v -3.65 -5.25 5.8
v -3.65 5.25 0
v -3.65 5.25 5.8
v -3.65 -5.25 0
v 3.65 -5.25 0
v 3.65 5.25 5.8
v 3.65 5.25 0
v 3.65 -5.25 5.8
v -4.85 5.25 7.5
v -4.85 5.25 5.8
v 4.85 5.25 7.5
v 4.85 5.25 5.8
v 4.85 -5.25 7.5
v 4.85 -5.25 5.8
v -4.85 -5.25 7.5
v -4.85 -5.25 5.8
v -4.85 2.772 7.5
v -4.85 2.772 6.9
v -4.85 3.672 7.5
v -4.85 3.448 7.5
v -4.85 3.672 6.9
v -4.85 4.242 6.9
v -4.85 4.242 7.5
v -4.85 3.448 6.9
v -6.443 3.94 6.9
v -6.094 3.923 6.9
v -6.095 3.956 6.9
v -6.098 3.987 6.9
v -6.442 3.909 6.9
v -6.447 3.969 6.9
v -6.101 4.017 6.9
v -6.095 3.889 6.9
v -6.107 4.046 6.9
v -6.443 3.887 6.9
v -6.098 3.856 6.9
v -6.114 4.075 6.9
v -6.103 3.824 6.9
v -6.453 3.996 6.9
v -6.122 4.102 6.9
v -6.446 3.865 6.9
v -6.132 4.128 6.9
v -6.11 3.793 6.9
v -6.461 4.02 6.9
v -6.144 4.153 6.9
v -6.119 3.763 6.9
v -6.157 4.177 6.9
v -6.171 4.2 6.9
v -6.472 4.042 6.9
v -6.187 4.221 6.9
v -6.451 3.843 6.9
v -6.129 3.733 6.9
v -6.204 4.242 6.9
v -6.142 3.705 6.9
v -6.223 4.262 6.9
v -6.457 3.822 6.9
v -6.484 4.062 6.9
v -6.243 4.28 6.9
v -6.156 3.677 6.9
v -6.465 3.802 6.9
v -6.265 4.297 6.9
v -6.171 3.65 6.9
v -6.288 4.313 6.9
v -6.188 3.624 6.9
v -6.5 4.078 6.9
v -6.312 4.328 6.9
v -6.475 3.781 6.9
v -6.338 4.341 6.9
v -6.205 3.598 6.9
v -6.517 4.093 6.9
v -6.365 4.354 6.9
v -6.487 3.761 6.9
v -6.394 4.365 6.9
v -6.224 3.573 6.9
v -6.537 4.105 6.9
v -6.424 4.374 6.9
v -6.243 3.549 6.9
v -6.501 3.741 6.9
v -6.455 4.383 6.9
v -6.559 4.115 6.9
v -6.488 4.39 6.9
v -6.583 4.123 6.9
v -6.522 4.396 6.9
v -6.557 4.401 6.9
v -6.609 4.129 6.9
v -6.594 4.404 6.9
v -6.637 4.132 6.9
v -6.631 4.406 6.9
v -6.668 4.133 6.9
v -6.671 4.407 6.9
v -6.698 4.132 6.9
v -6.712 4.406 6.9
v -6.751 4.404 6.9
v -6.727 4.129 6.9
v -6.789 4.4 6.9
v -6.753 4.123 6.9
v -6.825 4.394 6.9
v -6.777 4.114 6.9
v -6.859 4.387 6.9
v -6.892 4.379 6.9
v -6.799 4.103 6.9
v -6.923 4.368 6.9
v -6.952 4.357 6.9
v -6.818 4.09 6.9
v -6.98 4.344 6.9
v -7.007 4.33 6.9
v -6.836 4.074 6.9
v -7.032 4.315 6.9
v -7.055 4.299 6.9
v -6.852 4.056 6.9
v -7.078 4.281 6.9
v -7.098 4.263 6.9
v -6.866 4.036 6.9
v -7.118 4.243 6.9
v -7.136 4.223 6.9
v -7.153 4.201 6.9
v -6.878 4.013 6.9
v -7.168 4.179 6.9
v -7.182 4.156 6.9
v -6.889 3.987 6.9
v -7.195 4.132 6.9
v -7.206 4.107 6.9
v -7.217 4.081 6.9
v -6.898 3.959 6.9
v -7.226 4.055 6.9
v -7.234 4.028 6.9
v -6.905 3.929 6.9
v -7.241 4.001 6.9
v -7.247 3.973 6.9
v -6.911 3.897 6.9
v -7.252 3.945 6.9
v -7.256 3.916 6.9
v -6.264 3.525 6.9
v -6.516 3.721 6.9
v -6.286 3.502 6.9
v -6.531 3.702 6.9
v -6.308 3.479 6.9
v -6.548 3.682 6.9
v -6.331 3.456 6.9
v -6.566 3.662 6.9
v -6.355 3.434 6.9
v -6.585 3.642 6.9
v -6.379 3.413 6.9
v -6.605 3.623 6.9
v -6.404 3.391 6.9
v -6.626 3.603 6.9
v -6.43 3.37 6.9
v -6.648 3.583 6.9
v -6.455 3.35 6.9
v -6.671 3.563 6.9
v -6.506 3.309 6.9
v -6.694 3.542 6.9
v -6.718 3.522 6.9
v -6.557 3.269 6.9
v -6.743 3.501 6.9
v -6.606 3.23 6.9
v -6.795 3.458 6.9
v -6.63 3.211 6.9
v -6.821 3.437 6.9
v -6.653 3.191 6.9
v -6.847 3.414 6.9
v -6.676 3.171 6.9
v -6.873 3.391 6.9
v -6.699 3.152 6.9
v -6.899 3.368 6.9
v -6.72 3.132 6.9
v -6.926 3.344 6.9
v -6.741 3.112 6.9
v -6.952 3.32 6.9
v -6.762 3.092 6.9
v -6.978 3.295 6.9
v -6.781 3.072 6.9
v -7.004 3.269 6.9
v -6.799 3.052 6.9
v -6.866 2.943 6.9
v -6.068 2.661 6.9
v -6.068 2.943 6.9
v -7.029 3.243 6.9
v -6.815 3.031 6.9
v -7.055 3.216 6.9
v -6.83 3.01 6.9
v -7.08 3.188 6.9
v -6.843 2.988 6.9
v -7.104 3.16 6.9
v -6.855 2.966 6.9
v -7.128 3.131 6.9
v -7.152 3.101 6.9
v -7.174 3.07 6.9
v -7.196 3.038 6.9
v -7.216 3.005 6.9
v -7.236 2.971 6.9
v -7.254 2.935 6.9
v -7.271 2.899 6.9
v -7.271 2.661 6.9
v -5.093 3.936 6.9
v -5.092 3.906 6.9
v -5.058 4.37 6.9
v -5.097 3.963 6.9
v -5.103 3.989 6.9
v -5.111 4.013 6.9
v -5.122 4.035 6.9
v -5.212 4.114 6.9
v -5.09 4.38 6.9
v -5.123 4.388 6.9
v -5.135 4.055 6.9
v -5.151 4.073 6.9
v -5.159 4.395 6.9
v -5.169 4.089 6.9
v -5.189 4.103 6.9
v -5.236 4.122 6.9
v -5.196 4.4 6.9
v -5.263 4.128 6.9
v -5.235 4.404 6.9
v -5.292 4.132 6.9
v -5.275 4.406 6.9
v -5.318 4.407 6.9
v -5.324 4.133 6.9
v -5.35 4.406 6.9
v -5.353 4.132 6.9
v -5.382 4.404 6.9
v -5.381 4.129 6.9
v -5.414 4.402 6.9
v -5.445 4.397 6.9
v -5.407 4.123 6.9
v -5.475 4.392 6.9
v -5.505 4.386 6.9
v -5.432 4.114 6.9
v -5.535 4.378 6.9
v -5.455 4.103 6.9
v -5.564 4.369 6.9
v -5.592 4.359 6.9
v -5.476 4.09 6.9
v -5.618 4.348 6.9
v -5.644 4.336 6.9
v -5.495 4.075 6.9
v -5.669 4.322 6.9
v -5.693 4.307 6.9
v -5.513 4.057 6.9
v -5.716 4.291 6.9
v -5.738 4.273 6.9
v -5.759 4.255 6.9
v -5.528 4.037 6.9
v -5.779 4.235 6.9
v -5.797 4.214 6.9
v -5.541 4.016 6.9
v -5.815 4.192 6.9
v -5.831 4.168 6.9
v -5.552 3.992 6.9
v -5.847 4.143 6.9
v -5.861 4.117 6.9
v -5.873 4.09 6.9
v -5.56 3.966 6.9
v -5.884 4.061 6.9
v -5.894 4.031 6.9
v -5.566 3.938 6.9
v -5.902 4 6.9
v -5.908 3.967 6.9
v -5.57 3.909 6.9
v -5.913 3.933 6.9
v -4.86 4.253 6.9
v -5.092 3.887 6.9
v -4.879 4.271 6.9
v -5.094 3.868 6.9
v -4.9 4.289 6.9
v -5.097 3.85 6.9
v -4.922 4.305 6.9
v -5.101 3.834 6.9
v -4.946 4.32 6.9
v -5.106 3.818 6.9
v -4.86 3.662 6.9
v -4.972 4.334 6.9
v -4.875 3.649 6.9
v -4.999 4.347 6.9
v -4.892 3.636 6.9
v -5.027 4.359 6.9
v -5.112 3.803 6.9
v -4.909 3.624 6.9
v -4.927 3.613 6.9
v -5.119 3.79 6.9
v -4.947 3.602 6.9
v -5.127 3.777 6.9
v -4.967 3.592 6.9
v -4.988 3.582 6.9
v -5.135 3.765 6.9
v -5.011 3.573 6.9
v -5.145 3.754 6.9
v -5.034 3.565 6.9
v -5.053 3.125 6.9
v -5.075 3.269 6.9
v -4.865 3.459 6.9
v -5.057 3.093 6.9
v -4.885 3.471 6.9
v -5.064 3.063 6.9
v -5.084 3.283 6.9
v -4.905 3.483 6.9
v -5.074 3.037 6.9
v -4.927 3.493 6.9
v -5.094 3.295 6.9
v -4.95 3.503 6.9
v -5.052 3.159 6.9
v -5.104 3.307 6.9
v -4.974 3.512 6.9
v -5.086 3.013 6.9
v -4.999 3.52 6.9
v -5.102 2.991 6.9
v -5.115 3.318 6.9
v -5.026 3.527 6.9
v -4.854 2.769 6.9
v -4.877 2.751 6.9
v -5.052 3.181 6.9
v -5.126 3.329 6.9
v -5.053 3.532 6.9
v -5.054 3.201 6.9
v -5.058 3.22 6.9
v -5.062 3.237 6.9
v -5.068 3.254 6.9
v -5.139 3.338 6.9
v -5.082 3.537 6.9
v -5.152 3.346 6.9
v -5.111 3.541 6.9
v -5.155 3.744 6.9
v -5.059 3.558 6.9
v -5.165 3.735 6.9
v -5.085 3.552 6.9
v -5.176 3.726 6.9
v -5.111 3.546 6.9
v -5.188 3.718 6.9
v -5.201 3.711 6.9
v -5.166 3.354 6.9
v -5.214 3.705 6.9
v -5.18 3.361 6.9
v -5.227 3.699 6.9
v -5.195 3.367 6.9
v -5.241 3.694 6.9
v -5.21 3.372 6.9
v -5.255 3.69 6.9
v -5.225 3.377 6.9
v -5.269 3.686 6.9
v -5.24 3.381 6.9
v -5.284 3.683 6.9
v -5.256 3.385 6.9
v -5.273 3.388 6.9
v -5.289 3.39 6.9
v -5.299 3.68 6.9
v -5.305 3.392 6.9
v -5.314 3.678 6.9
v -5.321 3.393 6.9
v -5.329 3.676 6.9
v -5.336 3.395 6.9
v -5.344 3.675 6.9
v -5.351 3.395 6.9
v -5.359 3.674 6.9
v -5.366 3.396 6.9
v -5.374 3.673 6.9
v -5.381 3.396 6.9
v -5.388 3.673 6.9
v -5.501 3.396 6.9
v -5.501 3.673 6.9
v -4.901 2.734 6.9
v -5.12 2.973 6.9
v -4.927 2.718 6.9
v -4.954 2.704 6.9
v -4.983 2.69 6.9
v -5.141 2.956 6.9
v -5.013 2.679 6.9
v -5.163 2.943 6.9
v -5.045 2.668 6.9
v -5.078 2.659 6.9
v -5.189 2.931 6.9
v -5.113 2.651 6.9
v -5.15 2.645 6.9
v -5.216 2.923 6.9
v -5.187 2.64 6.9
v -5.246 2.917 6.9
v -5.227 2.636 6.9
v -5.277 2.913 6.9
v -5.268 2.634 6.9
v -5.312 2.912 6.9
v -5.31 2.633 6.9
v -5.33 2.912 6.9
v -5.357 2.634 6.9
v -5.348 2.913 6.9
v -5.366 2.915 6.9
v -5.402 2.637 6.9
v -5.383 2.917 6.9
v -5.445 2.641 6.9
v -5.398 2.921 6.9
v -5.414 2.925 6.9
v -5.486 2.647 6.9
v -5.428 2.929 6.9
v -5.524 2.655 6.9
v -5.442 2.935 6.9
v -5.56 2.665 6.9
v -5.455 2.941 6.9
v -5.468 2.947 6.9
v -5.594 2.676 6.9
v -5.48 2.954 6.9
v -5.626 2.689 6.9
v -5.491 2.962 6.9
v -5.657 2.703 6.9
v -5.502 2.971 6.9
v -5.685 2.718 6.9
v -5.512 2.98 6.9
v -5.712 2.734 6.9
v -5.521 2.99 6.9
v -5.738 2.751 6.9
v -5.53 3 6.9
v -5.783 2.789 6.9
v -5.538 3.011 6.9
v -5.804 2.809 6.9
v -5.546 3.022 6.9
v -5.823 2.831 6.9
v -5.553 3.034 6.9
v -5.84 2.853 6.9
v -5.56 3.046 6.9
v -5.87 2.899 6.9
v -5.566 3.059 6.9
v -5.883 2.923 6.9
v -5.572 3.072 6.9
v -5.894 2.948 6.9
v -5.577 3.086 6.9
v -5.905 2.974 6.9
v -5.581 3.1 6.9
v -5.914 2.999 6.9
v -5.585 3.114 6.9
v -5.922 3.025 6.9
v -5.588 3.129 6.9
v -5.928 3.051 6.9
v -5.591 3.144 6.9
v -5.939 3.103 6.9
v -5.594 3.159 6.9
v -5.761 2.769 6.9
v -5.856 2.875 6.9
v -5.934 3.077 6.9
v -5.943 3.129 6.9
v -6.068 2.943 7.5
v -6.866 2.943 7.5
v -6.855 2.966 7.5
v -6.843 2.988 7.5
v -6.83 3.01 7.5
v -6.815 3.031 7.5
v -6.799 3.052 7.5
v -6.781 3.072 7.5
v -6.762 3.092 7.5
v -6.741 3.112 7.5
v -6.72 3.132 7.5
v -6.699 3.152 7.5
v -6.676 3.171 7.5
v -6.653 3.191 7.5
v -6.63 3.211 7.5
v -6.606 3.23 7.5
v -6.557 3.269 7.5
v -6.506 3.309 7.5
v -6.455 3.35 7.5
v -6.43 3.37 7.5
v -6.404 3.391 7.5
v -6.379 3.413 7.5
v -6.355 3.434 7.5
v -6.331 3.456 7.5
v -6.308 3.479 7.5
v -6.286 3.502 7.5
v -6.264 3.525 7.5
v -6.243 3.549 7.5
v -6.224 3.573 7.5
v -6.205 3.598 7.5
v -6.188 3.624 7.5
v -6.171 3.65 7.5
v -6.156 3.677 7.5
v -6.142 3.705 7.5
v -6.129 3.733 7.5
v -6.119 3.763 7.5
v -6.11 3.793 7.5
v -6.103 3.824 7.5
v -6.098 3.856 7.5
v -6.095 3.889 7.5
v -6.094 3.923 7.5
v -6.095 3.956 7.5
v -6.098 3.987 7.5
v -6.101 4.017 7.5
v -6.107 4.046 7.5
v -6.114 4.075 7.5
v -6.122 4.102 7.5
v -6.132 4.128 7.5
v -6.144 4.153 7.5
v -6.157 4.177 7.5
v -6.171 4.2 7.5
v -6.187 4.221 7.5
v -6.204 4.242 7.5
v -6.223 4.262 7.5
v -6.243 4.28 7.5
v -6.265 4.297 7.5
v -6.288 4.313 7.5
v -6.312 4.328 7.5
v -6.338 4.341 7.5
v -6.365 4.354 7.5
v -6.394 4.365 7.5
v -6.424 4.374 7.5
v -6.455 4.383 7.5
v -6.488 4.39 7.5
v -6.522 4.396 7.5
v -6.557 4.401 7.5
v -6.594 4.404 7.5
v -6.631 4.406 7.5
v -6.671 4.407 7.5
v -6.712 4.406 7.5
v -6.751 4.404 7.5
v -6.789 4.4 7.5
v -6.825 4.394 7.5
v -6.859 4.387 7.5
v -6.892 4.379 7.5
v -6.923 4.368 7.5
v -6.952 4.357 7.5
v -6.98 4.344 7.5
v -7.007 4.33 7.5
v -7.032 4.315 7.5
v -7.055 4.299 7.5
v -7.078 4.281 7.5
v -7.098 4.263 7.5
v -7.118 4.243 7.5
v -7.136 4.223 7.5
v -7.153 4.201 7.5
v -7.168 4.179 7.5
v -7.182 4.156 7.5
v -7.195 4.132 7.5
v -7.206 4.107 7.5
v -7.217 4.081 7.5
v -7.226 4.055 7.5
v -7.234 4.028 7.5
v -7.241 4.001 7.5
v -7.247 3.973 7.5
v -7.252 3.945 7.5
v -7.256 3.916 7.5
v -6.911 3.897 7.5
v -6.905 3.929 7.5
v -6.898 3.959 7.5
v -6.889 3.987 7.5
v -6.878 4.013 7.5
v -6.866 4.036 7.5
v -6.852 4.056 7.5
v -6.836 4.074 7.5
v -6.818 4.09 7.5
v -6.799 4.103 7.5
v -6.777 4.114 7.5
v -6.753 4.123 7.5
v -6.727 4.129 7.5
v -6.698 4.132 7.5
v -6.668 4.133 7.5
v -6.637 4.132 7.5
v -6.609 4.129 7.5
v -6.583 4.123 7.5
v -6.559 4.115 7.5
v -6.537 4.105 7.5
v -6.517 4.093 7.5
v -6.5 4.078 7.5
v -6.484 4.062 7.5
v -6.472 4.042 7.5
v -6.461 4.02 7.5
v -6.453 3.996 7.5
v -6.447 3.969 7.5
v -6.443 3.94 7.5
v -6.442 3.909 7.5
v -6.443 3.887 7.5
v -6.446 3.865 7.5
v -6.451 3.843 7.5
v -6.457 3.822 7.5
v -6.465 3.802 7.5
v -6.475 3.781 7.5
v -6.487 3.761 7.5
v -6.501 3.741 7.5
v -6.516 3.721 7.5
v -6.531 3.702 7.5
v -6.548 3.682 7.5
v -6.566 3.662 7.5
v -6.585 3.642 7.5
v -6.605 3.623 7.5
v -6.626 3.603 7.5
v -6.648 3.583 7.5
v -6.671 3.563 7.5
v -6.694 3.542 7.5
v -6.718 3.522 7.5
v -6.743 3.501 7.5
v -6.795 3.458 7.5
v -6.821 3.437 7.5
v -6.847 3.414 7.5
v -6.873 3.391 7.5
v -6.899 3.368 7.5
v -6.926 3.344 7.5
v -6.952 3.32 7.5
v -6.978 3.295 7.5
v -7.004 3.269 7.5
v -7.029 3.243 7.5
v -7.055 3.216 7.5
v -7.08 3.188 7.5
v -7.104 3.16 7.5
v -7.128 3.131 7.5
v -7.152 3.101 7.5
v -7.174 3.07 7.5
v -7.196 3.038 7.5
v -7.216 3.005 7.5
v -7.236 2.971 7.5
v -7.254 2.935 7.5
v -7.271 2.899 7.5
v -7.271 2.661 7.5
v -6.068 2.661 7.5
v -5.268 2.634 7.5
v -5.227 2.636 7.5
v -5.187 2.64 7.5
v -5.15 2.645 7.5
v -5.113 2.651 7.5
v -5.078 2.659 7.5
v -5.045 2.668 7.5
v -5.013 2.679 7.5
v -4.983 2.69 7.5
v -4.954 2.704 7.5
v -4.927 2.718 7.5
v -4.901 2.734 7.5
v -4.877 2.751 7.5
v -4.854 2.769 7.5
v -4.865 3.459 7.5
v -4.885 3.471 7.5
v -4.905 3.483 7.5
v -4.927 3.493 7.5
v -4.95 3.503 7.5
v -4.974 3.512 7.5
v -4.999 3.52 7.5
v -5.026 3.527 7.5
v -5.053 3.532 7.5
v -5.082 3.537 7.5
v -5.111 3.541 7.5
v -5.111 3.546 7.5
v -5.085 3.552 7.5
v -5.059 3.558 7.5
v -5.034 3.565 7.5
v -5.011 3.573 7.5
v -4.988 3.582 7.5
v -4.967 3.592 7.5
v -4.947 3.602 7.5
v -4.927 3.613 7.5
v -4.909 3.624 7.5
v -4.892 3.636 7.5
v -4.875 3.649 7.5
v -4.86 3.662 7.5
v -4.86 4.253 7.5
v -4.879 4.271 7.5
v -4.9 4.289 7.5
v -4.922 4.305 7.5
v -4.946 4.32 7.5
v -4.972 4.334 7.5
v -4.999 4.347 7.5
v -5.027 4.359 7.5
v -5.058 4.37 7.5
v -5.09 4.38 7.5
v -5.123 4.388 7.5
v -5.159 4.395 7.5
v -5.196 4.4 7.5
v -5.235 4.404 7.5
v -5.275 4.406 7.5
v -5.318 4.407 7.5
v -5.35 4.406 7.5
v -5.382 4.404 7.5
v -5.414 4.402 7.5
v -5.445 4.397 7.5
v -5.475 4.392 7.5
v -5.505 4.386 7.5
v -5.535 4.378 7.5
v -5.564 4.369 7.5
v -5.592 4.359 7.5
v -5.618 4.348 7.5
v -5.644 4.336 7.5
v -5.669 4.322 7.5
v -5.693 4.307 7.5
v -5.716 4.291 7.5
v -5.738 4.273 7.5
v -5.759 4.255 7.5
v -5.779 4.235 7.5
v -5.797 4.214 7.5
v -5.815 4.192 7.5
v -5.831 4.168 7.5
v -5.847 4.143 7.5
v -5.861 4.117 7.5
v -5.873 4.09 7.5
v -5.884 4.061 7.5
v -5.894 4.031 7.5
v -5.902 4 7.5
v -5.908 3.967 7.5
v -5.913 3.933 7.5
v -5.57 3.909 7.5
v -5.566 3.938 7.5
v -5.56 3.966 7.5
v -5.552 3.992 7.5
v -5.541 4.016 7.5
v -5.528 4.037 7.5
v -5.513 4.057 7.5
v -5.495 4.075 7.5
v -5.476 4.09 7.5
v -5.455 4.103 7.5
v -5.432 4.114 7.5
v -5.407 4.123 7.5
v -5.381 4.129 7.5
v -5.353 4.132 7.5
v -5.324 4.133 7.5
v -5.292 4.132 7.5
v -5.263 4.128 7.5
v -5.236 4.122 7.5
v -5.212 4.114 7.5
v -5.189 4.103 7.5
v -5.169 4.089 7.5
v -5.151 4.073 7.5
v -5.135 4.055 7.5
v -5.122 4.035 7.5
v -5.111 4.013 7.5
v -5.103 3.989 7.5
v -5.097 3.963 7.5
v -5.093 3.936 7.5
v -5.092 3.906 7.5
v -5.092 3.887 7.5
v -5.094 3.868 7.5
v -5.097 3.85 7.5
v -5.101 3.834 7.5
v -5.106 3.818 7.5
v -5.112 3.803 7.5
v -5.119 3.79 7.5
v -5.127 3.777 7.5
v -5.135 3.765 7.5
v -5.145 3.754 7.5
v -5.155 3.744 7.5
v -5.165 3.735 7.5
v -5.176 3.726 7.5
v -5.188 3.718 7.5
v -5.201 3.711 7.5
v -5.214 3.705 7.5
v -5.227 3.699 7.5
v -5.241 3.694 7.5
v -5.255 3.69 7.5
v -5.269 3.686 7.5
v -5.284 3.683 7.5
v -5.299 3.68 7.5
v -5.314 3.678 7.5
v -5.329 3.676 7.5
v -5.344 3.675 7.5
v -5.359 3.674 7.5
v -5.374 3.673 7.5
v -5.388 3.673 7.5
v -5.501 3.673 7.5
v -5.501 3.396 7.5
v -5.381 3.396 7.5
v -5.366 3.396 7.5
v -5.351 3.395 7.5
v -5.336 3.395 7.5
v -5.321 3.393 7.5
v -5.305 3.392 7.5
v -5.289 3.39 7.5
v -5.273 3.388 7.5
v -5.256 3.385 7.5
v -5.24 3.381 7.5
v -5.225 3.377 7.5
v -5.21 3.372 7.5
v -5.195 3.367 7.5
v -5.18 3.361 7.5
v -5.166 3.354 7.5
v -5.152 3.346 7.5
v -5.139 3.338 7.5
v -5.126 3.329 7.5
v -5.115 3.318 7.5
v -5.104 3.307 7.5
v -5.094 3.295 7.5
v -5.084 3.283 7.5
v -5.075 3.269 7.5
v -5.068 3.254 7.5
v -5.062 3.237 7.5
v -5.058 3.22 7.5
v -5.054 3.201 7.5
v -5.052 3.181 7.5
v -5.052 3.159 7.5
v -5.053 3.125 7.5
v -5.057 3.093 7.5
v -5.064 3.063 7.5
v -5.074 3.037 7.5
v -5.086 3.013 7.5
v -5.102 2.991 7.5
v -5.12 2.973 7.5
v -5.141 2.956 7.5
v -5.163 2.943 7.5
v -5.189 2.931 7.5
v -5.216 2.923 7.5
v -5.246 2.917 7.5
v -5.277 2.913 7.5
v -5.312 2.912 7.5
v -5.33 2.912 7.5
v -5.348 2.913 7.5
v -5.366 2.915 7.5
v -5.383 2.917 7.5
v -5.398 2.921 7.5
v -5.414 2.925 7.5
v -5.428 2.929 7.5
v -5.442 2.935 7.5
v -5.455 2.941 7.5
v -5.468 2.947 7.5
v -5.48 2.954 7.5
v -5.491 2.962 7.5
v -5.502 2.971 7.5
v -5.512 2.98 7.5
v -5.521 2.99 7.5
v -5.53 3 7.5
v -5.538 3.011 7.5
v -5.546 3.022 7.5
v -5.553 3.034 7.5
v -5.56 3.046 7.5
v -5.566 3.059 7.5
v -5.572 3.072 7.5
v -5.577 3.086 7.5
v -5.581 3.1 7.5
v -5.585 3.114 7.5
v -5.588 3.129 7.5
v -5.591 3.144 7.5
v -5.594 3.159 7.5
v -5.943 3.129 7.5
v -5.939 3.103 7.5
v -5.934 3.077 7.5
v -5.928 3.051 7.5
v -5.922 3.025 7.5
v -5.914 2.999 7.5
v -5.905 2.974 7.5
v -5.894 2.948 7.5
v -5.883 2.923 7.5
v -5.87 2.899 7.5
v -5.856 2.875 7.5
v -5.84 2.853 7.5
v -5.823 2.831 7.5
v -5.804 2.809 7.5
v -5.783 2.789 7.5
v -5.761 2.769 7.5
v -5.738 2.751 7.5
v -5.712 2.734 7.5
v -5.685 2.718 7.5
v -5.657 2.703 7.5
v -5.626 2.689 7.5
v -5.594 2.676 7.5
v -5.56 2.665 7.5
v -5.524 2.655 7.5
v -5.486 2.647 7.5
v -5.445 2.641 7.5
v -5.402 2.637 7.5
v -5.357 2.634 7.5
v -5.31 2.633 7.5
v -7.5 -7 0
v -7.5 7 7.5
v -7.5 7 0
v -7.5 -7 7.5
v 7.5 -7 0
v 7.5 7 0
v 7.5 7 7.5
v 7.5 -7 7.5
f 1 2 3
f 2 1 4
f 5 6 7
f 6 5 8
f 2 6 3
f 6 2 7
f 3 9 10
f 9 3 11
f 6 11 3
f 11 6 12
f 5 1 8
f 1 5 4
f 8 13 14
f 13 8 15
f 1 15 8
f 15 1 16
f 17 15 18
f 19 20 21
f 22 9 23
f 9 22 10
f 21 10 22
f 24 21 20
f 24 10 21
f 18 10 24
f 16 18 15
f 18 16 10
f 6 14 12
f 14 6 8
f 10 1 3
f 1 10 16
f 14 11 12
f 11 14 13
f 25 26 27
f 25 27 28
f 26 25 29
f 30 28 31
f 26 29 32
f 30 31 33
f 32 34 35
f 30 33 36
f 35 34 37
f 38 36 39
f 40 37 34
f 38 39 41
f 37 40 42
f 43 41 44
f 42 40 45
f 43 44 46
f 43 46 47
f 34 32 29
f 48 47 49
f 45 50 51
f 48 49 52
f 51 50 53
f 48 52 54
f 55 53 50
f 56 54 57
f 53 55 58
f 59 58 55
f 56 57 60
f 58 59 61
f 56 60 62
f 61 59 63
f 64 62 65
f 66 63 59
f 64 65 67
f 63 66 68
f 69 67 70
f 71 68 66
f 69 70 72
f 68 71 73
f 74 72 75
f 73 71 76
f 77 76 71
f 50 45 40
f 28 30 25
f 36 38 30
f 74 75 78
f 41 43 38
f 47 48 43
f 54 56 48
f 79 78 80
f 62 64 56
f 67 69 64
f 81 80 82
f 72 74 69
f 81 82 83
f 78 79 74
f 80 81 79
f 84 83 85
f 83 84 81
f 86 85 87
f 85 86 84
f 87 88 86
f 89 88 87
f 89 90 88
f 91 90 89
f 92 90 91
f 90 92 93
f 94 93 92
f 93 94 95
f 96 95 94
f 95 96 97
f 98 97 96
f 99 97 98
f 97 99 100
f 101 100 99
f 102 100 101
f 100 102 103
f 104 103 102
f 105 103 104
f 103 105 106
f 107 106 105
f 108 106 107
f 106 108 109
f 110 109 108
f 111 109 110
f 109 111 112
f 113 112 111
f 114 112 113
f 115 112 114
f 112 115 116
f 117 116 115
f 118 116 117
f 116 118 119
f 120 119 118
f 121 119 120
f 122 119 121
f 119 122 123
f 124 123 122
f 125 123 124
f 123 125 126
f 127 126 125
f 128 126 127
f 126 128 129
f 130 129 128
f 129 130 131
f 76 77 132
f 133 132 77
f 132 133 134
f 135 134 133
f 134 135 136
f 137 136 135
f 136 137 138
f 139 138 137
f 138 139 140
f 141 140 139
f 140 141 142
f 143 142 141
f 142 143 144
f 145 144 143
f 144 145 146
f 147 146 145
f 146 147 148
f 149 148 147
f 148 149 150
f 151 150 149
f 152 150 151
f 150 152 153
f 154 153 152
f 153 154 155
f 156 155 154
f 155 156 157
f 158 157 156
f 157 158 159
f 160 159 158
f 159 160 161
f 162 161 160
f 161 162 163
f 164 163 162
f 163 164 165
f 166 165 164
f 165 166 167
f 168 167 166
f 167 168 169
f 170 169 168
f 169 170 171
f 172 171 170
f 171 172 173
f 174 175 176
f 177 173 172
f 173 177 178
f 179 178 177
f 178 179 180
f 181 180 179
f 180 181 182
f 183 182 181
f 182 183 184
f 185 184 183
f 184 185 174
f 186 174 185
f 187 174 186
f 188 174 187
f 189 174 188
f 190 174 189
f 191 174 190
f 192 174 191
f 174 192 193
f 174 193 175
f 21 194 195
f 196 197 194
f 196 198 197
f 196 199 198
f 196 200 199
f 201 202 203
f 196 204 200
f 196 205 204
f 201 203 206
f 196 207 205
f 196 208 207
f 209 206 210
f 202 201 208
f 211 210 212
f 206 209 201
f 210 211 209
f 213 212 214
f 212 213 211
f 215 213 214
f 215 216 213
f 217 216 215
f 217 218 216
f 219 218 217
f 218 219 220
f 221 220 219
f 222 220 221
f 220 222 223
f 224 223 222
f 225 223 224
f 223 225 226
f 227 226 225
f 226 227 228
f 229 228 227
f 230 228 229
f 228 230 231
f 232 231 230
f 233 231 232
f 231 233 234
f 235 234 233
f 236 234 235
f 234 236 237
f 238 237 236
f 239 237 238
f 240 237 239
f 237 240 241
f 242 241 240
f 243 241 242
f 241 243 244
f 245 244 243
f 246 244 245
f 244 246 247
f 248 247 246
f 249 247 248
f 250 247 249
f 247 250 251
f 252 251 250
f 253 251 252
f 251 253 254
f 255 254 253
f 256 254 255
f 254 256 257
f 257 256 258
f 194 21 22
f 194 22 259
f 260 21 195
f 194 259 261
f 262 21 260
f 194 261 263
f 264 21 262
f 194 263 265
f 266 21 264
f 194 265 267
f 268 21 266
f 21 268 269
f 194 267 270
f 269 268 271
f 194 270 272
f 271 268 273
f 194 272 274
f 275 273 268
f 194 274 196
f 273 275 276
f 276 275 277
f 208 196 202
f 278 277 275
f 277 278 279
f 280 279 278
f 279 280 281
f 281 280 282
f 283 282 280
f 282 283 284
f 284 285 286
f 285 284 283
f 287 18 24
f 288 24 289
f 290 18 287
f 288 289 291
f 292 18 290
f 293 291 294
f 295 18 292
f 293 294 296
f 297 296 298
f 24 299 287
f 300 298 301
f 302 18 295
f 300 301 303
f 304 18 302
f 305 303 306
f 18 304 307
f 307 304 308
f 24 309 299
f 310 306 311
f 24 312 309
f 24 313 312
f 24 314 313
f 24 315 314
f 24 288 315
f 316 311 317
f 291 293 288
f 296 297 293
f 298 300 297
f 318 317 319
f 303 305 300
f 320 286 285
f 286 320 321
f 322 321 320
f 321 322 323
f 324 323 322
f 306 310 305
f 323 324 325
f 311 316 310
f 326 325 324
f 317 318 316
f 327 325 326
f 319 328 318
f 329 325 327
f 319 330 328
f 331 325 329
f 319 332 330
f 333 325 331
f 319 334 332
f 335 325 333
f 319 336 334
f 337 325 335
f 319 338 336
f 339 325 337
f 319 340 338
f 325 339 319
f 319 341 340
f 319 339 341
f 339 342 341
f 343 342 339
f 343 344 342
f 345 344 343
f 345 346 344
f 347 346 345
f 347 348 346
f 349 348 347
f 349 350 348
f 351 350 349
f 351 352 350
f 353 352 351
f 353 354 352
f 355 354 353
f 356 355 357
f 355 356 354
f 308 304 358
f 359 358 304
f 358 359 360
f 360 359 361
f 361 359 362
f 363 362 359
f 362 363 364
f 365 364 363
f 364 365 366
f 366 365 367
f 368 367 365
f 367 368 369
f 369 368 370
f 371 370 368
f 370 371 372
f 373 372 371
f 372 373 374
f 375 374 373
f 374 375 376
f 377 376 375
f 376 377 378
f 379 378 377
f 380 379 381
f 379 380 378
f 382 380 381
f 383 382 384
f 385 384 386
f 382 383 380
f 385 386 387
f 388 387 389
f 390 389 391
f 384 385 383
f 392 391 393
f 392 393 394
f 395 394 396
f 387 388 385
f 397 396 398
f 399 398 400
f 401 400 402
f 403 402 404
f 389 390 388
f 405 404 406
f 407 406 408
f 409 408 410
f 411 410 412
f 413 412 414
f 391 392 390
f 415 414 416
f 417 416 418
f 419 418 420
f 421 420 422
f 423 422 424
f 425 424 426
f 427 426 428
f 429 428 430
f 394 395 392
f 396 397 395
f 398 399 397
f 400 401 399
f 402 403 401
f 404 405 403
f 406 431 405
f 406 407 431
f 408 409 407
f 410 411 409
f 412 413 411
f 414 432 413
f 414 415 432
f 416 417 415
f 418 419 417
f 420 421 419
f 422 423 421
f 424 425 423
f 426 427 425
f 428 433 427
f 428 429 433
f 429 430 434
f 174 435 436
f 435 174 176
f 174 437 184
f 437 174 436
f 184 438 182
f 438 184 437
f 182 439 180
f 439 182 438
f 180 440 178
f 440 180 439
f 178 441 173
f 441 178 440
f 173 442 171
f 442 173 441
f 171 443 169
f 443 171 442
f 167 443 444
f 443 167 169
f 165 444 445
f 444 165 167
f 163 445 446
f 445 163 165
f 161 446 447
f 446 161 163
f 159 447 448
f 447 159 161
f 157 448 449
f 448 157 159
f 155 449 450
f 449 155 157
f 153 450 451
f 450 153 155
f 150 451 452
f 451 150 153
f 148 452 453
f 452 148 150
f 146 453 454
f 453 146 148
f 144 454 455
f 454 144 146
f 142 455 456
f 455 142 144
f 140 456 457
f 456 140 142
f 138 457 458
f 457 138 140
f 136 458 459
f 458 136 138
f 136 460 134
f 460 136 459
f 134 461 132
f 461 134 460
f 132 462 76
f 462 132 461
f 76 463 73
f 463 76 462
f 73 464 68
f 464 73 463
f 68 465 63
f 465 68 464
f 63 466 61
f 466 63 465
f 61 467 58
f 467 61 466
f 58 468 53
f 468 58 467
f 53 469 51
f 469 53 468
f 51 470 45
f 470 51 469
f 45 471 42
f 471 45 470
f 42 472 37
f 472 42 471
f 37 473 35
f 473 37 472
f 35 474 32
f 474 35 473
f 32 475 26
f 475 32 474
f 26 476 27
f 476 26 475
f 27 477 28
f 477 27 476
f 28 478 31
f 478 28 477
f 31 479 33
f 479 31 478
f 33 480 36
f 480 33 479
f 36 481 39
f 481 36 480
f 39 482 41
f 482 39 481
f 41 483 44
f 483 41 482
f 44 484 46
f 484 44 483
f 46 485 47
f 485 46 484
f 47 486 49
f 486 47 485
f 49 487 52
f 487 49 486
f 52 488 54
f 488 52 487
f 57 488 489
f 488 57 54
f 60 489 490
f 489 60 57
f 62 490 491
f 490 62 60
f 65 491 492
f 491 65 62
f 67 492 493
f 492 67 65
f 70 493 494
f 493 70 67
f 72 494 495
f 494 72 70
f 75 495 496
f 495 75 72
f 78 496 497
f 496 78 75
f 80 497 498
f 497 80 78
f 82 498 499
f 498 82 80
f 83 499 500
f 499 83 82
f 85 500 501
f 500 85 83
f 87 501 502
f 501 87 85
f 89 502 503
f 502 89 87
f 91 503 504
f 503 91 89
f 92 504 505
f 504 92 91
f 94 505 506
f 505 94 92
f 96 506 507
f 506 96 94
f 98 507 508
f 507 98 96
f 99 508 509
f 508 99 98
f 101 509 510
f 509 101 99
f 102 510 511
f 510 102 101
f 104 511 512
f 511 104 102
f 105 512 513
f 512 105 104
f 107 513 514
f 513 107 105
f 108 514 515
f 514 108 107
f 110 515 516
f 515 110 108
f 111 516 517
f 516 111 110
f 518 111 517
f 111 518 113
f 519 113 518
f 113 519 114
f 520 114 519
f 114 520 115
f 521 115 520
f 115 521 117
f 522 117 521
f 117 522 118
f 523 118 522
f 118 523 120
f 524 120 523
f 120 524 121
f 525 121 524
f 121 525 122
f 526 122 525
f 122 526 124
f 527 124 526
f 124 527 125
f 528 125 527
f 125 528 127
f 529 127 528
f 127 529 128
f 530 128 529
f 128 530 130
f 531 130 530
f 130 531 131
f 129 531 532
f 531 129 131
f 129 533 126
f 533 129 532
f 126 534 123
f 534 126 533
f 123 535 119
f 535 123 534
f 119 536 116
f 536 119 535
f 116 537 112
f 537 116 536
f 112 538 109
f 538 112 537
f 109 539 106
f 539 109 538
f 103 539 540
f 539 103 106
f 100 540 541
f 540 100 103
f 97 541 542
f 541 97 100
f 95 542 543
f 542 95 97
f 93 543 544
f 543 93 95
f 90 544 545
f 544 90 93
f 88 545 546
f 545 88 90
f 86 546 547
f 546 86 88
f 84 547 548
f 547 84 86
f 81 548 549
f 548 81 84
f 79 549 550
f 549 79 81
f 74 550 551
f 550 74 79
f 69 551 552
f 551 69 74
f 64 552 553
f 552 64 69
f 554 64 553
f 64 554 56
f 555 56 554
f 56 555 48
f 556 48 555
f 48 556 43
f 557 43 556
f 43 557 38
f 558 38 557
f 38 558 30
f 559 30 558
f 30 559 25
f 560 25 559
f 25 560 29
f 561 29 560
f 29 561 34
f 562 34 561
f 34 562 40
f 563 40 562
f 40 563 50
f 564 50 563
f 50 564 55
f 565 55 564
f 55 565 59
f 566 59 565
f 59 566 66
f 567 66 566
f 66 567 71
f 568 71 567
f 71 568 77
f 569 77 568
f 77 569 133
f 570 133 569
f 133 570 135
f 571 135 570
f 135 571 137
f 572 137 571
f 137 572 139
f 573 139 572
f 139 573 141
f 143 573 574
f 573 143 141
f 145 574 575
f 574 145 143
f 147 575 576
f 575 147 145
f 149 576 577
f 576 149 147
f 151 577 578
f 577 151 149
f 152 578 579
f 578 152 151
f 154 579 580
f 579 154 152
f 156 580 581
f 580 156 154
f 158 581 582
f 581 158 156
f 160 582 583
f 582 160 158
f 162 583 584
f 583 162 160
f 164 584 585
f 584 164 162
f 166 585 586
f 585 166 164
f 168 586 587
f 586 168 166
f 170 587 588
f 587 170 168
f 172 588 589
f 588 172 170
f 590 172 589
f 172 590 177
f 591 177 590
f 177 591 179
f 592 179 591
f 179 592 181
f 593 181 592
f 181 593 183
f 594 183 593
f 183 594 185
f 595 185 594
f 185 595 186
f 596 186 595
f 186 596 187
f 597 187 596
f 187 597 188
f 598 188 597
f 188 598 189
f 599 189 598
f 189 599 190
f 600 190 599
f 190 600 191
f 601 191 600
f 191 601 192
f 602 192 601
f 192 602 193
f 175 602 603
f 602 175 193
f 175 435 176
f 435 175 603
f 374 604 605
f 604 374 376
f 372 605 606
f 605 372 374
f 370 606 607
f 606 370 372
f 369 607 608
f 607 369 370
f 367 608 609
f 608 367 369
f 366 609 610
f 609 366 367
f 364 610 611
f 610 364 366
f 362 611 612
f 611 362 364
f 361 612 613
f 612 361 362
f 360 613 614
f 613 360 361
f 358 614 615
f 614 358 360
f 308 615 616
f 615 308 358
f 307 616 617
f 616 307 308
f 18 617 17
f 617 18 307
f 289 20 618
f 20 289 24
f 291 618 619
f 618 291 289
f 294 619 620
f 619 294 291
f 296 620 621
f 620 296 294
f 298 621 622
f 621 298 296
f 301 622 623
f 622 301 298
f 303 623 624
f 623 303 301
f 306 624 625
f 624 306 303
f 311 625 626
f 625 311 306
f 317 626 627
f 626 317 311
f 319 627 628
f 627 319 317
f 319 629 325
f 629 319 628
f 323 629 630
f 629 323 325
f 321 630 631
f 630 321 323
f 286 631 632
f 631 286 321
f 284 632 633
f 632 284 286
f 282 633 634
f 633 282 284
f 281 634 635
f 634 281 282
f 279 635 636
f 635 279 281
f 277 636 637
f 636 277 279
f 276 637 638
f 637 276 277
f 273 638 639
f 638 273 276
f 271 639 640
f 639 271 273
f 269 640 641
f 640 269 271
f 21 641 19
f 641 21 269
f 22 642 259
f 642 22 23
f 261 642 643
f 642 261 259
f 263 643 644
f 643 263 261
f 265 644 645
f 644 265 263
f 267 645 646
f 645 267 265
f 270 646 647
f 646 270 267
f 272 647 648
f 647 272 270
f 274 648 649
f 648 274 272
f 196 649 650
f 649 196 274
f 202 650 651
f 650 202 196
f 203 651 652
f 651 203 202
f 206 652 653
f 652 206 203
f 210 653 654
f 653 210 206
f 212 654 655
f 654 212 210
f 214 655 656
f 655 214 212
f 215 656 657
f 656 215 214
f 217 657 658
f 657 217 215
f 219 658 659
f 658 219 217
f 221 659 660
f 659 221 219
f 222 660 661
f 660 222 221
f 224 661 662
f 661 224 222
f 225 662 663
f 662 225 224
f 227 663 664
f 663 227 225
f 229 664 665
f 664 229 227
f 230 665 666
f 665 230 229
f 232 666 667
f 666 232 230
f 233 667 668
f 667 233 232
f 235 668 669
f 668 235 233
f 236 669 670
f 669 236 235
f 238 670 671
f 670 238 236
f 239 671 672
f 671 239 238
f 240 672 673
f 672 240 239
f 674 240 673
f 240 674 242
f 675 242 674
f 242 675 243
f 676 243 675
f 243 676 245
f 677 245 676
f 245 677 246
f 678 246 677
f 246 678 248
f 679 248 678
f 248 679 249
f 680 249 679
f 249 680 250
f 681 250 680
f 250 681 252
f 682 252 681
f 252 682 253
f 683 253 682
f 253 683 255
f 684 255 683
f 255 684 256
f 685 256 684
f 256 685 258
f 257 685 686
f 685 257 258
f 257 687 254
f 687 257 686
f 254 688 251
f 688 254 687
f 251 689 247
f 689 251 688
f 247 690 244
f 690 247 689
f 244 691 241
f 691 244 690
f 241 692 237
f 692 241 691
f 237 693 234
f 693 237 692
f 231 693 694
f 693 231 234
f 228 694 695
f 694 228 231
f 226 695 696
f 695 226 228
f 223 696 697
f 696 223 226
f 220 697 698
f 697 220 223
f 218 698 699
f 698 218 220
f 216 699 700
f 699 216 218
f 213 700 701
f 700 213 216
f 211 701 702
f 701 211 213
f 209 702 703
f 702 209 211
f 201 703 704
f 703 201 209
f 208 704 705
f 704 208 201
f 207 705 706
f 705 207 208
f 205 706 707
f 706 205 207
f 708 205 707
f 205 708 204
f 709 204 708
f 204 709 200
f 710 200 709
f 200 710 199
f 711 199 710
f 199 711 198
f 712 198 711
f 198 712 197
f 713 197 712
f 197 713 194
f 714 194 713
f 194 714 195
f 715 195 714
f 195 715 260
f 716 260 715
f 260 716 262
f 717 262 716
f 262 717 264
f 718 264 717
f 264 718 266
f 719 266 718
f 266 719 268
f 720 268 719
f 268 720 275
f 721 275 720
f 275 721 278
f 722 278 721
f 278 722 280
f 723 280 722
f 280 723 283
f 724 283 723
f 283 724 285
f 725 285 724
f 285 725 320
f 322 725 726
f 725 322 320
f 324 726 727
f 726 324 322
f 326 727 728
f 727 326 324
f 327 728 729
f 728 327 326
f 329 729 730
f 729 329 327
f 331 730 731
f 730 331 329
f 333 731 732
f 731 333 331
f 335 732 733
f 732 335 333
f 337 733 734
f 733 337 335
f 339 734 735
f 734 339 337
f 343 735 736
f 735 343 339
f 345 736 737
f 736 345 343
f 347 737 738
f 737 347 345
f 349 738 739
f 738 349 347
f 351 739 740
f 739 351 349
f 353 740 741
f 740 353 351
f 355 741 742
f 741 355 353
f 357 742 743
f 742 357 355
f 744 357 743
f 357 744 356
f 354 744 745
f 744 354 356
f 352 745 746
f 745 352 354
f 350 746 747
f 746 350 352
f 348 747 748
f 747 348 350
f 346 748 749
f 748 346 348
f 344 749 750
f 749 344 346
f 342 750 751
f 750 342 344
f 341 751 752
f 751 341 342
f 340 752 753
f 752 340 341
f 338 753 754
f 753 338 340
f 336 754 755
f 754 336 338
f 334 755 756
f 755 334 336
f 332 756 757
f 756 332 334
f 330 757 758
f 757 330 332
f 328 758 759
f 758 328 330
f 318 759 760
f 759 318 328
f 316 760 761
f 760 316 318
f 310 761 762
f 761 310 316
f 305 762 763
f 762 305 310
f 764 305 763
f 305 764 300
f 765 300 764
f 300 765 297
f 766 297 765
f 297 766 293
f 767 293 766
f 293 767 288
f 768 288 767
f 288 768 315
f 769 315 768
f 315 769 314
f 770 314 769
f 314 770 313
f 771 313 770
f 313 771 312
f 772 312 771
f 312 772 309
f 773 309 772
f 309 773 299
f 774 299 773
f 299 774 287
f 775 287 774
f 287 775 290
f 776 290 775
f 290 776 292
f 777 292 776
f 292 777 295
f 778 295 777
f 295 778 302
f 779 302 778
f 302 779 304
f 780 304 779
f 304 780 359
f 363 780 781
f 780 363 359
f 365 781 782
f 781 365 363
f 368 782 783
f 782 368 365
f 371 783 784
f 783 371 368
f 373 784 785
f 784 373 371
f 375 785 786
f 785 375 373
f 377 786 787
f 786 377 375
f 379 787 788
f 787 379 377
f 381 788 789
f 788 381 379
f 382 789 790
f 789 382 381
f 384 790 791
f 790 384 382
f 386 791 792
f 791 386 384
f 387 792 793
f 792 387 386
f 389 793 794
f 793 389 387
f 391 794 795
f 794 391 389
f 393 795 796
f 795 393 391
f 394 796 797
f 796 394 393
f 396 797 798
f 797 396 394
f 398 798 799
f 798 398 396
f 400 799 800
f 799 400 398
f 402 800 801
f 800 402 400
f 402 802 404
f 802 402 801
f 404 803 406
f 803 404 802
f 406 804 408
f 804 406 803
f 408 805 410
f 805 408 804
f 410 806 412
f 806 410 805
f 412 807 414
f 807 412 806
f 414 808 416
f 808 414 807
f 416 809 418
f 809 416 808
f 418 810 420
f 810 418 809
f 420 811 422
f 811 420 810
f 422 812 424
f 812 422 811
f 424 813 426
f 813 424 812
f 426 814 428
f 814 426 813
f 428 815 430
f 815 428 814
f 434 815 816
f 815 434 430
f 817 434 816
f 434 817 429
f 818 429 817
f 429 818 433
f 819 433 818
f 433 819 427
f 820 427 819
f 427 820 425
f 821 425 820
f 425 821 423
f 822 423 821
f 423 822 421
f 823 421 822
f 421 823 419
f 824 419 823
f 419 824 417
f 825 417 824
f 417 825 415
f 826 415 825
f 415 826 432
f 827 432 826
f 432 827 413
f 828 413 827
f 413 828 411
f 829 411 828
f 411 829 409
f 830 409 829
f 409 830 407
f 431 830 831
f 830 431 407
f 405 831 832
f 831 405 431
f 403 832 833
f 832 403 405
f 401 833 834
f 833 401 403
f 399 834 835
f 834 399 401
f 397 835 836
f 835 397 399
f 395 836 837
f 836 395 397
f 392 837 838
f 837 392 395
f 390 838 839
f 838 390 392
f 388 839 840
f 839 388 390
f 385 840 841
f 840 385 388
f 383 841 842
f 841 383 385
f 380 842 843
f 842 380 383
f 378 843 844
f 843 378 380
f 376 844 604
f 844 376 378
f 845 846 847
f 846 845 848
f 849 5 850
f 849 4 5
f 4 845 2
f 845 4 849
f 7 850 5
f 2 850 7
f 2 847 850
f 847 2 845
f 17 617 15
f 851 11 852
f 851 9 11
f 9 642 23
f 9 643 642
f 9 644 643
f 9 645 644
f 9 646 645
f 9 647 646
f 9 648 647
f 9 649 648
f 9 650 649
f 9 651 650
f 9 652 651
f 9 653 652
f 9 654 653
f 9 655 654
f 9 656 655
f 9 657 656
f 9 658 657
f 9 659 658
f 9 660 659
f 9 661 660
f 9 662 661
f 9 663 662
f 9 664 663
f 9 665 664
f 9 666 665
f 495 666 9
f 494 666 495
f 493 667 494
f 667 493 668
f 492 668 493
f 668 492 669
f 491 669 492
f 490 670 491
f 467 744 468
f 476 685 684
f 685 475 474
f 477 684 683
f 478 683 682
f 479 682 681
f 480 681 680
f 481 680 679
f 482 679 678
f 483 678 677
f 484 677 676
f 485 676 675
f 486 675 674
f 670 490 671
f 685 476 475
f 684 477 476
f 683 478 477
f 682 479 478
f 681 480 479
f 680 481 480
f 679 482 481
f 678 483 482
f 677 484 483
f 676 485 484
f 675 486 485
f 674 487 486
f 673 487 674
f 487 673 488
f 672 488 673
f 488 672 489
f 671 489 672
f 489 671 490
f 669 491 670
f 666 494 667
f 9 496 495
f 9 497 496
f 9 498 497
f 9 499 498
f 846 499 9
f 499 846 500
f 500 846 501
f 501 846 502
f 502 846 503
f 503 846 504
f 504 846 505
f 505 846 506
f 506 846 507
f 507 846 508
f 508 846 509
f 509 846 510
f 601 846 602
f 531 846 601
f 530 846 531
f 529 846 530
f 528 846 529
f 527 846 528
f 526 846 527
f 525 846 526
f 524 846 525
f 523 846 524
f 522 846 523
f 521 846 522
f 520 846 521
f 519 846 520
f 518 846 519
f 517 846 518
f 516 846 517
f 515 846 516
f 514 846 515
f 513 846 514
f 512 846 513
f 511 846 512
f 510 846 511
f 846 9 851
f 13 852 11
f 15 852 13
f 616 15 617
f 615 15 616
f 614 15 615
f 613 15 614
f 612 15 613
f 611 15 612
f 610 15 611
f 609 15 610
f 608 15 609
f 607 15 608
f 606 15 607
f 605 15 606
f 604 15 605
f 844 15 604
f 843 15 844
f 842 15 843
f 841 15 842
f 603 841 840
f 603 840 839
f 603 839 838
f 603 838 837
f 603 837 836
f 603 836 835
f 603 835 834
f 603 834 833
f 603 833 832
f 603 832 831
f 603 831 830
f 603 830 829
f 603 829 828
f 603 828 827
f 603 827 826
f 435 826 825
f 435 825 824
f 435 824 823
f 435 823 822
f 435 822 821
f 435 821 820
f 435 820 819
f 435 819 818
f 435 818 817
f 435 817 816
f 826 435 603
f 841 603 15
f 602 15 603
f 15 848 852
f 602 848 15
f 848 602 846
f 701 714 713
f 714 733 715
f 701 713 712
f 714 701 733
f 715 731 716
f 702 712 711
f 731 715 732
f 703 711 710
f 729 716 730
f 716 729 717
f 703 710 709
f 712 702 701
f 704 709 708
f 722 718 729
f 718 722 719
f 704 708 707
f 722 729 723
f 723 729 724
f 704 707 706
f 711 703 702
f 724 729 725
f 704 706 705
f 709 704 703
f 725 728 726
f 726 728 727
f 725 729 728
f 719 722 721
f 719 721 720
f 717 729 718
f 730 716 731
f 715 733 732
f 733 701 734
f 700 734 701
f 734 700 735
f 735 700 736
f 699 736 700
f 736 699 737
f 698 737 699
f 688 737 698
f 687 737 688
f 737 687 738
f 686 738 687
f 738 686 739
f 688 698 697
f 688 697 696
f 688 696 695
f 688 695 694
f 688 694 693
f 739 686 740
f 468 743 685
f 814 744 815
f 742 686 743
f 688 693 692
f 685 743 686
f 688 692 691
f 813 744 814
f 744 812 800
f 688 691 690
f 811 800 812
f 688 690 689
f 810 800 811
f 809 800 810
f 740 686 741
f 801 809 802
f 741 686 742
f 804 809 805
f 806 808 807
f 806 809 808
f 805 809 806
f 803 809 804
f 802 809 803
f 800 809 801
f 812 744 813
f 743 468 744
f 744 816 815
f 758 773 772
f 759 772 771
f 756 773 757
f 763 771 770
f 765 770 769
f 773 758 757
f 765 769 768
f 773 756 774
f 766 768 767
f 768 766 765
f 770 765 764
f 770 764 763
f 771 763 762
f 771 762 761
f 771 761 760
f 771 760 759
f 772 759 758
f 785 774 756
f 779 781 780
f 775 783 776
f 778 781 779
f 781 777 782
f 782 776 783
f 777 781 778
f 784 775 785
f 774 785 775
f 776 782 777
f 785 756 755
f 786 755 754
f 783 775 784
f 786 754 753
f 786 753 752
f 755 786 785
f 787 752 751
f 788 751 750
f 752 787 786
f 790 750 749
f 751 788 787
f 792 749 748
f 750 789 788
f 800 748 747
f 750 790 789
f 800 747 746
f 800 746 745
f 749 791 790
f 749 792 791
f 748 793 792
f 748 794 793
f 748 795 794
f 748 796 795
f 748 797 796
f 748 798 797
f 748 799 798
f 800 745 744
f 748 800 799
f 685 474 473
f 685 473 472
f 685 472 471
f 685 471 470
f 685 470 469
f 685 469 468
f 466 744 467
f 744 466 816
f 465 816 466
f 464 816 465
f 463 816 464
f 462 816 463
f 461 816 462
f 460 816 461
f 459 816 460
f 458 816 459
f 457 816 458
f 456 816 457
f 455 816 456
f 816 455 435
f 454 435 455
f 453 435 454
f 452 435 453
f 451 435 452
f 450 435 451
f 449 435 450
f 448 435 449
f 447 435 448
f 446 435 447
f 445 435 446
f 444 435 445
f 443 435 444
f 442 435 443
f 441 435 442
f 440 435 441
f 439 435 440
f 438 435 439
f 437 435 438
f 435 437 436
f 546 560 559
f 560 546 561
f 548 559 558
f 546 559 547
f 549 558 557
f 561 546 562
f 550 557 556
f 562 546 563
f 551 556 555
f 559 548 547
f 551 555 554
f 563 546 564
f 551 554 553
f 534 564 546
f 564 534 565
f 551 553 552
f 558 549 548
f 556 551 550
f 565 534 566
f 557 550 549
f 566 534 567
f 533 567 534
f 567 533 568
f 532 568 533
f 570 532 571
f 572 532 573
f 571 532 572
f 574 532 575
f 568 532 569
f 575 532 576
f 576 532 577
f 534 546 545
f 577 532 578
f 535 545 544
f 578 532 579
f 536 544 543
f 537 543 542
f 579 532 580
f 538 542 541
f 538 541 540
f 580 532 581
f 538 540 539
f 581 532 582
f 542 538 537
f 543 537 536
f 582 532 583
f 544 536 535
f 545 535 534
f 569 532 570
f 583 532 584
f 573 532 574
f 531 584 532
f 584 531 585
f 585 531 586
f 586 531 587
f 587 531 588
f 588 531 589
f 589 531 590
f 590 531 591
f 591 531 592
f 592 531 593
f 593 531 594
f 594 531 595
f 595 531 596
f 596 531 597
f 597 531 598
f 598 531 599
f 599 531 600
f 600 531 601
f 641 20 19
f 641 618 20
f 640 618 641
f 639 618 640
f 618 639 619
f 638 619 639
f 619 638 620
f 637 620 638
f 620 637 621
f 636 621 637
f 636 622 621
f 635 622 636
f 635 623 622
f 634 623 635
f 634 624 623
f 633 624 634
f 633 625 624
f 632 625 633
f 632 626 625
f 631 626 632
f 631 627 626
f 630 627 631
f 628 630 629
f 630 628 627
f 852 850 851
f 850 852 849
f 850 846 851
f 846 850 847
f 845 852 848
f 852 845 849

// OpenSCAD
$fn = 50;

difference() {
	union() {
		translate(v = [0, -5, 7.5]) {
			rotate(a = [0, 180, 0]) {
				difference() {
					union() {
						translate(v = [-7.5, -2.0, 0]) {
							cube(size = [15.0, 14.0, 7.5]);
						}
					}
					union() {
						translate(v = [-3.65, -0.25, -0.1]) {
							cube(size = [7.3, 10.5, 7.7]);
						}
						translate(v = [-4.85, -0.25, -0.1]) {
							cube(size = [9.7, 10.5, 1.8]);
						}
						translate(v = [6, 8.5, 0.6]) {
							rotate(a = [0, 180, 0]) {
								linear_extrude(height = 0.7) {
									text(font = "Arial:style=Bold", halign = "center", size = 1.8, text = "23", valign = "center");
								}
							}
						}
					}
				}
			}
		}
	}
	union();
}
